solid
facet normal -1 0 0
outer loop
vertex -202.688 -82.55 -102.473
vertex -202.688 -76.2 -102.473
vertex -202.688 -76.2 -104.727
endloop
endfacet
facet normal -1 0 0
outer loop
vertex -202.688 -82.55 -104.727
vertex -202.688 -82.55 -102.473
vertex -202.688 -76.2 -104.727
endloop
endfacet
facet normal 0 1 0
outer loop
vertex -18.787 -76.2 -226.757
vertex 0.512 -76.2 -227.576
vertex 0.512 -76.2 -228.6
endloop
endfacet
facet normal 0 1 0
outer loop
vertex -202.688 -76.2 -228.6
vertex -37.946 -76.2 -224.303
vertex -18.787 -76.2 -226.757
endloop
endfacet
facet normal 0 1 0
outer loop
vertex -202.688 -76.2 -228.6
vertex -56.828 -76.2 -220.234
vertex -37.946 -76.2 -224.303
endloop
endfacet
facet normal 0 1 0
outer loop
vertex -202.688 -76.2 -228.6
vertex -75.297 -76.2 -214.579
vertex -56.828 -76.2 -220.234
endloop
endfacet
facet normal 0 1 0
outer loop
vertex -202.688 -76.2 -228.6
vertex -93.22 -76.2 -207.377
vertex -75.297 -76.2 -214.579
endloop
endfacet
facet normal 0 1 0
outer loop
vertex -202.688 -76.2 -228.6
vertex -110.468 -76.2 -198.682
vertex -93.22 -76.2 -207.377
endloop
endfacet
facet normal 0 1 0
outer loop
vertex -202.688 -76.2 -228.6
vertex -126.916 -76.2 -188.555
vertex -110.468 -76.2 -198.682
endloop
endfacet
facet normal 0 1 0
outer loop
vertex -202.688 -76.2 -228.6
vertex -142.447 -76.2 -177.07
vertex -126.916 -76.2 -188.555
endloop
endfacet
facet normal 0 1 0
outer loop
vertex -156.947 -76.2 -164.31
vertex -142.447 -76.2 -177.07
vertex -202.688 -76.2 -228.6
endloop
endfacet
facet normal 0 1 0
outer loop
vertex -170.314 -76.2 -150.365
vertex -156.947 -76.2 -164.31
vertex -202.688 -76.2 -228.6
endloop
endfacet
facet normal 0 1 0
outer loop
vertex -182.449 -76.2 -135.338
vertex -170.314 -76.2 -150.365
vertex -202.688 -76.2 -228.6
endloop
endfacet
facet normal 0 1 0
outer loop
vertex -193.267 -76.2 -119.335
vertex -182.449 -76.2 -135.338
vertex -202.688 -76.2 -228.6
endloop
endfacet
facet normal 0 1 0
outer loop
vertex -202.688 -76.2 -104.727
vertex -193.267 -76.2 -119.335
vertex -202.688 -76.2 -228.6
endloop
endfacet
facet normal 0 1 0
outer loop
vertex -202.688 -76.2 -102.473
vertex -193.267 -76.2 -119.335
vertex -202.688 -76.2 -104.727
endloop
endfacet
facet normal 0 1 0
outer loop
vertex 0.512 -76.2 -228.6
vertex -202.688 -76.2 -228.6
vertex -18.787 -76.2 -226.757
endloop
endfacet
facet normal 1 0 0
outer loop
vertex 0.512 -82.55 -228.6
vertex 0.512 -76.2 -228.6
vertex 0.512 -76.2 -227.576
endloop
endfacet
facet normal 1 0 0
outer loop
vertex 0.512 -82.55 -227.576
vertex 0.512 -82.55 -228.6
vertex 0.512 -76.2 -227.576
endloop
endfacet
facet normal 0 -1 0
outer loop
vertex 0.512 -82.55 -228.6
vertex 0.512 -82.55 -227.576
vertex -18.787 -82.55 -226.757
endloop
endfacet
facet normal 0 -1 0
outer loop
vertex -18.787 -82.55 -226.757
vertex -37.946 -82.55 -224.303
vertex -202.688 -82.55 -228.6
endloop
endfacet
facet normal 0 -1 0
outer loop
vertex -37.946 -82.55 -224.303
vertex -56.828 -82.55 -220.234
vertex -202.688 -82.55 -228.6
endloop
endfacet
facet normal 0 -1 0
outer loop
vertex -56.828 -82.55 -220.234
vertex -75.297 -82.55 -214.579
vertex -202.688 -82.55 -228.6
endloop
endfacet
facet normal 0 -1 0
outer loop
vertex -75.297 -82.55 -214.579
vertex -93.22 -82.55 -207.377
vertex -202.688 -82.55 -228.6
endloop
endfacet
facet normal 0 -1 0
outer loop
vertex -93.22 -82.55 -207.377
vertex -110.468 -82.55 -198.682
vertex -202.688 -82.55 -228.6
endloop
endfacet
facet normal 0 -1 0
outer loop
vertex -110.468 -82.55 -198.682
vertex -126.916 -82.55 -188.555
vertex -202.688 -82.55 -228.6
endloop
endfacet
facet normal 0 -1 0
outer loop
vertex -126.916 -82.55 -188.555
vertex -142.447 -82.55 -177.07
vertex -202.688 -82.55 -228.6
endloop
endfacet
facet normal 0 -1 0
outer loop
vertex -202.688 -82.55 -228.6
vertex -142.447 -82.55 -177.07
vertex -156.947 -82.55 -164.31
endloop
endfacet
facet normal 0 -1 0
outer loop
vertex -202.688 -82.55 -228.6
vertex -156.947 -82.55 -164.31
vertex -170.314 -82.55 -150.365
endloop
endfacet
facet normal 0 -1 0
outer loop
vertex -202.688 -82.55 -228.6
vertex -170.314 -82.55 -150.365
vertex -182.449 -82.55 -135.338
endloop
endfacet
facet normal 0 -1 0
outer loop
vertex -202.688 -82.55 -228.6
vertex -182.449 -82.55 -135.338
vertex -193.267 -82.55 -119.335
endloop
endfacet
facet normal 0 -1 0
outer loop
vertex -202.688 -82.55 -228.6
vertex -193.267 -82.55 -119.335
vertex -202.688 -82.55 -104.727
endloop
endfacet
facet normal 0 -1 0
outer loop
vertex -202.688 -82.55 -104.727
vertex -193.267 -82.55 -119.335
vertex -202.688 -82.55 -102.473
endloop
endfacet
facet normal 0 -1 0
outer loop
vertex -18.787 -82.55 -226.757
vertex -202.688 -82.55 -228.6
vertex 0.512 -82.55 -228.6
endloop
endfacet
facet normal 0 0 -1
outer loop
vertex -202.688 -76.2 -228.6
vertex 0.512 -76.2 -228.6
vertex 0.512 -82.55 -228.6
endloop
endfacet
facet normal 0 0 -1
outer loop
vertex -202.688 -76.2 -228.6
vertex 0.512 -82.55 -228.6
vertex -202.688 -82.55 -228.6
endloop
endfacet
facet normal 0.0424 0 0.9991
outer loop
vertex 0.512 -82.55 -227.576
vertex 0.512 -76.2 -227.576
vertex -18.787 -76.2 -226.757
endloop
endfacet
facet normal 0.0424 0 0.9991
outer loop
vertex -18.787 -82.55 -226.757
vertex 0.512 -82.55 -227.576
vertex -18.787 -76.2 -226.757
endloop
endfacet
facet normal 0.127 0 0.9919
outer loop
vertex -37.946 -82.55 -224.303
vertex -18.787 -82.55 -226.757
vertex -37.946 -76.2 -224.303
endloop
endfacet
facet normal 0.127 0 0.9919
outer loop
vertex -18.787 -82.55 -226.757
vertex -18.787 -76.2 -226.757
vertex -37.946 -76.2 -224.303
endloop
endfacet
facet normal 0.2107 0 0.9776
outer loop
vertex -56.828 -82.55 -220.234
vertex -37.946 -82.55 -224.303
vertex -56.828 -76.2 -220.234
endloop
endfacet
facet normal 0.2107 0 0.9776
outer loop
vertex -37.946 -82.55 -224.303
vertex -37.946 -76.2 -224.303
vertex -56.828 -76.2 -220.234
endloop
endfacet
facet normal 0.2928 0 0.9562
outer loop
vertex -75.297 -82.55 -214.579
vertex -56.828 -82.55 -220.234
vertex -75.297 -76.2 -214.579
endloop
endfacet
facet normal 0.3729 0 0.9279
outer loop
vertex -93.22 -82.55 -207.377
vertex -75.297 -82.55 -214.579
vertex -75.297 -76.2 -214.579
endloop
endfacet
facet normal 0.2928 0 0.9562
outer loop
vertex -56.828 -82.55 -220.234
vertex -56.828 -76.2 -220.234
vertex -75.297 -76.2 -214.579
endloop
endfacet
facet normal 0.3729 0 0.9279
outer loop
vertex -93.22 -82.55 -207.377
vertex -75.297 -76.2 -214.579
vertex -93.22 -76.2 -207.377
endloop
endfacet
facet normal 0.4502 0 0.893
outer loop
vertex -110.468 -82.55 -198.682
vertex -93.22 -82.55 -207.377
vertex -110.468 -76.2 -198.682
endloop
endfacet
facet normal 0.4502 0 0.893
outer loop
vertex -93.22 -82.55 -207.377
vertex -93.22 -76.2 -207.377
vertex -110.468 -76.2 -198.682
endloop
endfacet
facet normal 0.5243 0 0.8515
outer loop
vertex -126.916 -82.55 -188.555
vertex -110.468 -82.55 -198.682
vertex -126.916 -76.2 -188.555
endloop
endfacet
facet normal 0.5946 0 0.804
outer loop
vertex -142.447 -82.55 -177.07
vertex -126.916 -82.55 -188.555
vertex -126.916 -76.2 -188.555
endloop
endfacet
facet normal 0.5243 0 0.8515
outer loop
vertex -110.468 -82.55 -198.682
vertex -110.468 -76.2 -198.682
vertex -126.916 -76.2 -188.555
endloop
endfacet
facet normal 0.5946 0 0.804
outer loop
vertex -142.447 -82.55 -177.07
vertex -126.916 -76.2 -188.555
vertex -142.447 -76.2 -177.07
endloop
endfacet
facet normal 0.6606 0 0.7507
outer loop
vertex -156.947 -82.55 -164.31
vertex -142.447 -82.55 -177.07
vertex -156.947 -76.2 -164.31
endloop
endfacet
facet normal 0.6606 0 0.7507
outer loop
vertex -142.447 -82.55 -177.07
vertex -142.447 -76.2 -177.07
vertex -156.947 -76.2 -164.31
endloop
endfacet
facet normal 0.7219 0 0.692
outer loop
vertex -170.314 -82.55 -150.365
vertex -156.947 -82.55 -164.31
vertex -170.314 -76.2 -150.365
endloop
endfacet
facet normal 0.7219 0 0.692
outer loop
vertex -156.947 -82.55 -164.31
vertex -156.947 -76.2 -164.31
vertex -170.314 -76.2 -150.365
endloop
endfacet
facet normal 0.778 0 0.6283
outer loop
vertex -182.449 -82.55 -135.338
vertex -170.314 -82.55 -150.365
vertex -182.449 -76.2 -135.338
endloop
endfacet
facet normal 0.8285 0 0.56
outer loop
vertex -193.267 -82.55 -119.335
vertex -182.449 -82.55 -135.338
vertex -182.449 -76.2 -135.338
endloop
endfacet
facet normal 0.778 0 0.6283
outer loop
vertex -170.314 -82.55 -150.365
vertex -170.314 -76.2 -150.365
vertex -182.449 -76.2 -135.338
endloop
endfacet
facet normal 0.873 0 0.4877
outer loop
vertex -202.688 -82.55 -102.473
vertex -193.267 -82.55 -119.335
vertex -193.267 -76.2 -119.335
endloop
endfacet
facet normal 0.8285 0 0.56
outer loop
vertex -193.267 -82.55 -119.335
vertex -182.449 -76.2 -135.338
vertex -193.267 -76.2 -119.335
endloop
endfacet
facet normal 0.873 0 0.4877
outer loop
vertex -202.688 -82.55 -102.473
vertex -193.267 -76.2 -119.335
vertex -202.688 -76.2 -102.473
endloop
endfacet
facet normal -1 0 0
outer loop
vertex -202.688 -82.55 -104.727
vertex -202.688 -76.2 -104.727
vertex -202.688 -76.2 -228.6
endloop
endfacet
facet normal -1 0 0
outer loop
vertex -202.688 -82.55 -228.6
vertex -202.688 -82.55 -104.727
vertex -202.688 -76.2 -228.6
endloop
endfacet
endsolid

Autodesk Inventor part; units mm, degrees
ref_plane "YZ Plane" through (0, 0, 0) normal (1, 0, 0) x (0, 1, 0)
ref_plane "XZ Plane" through (0, 0, 0) normal (0, 1, 0) x (-1, 0, 0)
ref_plane "XY Plane" through (0, 0, 0) normal (0, 0, 1) x (1, 0, 0)
ref_plane "Work Plane1" through (-228.0882, -76.2, -228.6) normal (0, 1, 0) x (-1, 0, 0)
sketch "Sketch2" plane through (-228.0882, -76.2, -228.6) normal (0, 1, 0) x (-1, 0, 0)
  circle A0 centre (-228.6, 228.6) radius 227.5764 construction
  circle A1 centre (-228.6, 228.6) radius 228.6 construction
  arc A2 (-228.6, 1.0236) -> (-25.4, 126.1267) centre (-228.6, 228.6) ccw construction
  arc A3 (-228.6, 0) -> (-25.4, 123.8731) centre (-228.6, 228.6) ccw construction
  line L0 (-228.6, 0) -> (-25.4, 0)
  arc A4 (-228.6, 1.0236) -> (-25.4, 126.1267) centre (-228.6, 228.6) ccw
  line L1 (-228.6, 228.6) -> (-25.4, 126.1267) construction
  line L2 (-228.6, 228.6) -> (-228.6, 1.0236) construction
  line L3 (-25.4, 126.1267) -> (-25.4, 0)
  line L4 (-228.6, 0) -> (-228.6, 1.0236)
  line L5 (-228.6, 0) -> (-228.6, 1.0236) projected
  line L6 (-25.4, 123.8731) -> (-25.4, 126.1267) projected
  point P0 (-228.0882, 228.6)
  point P1 (-1.0236, 228.6)
  point P2 (0, 228.6)
  point P3 (-228.6, 228.6)
  point P4 (-228.6, 228.6)
  dimension "d14" = 203.2
extrude "Extrusion1" add sketch "Sketch2" against normal blind 6.35
properties part number "Cyclone Inlet"
